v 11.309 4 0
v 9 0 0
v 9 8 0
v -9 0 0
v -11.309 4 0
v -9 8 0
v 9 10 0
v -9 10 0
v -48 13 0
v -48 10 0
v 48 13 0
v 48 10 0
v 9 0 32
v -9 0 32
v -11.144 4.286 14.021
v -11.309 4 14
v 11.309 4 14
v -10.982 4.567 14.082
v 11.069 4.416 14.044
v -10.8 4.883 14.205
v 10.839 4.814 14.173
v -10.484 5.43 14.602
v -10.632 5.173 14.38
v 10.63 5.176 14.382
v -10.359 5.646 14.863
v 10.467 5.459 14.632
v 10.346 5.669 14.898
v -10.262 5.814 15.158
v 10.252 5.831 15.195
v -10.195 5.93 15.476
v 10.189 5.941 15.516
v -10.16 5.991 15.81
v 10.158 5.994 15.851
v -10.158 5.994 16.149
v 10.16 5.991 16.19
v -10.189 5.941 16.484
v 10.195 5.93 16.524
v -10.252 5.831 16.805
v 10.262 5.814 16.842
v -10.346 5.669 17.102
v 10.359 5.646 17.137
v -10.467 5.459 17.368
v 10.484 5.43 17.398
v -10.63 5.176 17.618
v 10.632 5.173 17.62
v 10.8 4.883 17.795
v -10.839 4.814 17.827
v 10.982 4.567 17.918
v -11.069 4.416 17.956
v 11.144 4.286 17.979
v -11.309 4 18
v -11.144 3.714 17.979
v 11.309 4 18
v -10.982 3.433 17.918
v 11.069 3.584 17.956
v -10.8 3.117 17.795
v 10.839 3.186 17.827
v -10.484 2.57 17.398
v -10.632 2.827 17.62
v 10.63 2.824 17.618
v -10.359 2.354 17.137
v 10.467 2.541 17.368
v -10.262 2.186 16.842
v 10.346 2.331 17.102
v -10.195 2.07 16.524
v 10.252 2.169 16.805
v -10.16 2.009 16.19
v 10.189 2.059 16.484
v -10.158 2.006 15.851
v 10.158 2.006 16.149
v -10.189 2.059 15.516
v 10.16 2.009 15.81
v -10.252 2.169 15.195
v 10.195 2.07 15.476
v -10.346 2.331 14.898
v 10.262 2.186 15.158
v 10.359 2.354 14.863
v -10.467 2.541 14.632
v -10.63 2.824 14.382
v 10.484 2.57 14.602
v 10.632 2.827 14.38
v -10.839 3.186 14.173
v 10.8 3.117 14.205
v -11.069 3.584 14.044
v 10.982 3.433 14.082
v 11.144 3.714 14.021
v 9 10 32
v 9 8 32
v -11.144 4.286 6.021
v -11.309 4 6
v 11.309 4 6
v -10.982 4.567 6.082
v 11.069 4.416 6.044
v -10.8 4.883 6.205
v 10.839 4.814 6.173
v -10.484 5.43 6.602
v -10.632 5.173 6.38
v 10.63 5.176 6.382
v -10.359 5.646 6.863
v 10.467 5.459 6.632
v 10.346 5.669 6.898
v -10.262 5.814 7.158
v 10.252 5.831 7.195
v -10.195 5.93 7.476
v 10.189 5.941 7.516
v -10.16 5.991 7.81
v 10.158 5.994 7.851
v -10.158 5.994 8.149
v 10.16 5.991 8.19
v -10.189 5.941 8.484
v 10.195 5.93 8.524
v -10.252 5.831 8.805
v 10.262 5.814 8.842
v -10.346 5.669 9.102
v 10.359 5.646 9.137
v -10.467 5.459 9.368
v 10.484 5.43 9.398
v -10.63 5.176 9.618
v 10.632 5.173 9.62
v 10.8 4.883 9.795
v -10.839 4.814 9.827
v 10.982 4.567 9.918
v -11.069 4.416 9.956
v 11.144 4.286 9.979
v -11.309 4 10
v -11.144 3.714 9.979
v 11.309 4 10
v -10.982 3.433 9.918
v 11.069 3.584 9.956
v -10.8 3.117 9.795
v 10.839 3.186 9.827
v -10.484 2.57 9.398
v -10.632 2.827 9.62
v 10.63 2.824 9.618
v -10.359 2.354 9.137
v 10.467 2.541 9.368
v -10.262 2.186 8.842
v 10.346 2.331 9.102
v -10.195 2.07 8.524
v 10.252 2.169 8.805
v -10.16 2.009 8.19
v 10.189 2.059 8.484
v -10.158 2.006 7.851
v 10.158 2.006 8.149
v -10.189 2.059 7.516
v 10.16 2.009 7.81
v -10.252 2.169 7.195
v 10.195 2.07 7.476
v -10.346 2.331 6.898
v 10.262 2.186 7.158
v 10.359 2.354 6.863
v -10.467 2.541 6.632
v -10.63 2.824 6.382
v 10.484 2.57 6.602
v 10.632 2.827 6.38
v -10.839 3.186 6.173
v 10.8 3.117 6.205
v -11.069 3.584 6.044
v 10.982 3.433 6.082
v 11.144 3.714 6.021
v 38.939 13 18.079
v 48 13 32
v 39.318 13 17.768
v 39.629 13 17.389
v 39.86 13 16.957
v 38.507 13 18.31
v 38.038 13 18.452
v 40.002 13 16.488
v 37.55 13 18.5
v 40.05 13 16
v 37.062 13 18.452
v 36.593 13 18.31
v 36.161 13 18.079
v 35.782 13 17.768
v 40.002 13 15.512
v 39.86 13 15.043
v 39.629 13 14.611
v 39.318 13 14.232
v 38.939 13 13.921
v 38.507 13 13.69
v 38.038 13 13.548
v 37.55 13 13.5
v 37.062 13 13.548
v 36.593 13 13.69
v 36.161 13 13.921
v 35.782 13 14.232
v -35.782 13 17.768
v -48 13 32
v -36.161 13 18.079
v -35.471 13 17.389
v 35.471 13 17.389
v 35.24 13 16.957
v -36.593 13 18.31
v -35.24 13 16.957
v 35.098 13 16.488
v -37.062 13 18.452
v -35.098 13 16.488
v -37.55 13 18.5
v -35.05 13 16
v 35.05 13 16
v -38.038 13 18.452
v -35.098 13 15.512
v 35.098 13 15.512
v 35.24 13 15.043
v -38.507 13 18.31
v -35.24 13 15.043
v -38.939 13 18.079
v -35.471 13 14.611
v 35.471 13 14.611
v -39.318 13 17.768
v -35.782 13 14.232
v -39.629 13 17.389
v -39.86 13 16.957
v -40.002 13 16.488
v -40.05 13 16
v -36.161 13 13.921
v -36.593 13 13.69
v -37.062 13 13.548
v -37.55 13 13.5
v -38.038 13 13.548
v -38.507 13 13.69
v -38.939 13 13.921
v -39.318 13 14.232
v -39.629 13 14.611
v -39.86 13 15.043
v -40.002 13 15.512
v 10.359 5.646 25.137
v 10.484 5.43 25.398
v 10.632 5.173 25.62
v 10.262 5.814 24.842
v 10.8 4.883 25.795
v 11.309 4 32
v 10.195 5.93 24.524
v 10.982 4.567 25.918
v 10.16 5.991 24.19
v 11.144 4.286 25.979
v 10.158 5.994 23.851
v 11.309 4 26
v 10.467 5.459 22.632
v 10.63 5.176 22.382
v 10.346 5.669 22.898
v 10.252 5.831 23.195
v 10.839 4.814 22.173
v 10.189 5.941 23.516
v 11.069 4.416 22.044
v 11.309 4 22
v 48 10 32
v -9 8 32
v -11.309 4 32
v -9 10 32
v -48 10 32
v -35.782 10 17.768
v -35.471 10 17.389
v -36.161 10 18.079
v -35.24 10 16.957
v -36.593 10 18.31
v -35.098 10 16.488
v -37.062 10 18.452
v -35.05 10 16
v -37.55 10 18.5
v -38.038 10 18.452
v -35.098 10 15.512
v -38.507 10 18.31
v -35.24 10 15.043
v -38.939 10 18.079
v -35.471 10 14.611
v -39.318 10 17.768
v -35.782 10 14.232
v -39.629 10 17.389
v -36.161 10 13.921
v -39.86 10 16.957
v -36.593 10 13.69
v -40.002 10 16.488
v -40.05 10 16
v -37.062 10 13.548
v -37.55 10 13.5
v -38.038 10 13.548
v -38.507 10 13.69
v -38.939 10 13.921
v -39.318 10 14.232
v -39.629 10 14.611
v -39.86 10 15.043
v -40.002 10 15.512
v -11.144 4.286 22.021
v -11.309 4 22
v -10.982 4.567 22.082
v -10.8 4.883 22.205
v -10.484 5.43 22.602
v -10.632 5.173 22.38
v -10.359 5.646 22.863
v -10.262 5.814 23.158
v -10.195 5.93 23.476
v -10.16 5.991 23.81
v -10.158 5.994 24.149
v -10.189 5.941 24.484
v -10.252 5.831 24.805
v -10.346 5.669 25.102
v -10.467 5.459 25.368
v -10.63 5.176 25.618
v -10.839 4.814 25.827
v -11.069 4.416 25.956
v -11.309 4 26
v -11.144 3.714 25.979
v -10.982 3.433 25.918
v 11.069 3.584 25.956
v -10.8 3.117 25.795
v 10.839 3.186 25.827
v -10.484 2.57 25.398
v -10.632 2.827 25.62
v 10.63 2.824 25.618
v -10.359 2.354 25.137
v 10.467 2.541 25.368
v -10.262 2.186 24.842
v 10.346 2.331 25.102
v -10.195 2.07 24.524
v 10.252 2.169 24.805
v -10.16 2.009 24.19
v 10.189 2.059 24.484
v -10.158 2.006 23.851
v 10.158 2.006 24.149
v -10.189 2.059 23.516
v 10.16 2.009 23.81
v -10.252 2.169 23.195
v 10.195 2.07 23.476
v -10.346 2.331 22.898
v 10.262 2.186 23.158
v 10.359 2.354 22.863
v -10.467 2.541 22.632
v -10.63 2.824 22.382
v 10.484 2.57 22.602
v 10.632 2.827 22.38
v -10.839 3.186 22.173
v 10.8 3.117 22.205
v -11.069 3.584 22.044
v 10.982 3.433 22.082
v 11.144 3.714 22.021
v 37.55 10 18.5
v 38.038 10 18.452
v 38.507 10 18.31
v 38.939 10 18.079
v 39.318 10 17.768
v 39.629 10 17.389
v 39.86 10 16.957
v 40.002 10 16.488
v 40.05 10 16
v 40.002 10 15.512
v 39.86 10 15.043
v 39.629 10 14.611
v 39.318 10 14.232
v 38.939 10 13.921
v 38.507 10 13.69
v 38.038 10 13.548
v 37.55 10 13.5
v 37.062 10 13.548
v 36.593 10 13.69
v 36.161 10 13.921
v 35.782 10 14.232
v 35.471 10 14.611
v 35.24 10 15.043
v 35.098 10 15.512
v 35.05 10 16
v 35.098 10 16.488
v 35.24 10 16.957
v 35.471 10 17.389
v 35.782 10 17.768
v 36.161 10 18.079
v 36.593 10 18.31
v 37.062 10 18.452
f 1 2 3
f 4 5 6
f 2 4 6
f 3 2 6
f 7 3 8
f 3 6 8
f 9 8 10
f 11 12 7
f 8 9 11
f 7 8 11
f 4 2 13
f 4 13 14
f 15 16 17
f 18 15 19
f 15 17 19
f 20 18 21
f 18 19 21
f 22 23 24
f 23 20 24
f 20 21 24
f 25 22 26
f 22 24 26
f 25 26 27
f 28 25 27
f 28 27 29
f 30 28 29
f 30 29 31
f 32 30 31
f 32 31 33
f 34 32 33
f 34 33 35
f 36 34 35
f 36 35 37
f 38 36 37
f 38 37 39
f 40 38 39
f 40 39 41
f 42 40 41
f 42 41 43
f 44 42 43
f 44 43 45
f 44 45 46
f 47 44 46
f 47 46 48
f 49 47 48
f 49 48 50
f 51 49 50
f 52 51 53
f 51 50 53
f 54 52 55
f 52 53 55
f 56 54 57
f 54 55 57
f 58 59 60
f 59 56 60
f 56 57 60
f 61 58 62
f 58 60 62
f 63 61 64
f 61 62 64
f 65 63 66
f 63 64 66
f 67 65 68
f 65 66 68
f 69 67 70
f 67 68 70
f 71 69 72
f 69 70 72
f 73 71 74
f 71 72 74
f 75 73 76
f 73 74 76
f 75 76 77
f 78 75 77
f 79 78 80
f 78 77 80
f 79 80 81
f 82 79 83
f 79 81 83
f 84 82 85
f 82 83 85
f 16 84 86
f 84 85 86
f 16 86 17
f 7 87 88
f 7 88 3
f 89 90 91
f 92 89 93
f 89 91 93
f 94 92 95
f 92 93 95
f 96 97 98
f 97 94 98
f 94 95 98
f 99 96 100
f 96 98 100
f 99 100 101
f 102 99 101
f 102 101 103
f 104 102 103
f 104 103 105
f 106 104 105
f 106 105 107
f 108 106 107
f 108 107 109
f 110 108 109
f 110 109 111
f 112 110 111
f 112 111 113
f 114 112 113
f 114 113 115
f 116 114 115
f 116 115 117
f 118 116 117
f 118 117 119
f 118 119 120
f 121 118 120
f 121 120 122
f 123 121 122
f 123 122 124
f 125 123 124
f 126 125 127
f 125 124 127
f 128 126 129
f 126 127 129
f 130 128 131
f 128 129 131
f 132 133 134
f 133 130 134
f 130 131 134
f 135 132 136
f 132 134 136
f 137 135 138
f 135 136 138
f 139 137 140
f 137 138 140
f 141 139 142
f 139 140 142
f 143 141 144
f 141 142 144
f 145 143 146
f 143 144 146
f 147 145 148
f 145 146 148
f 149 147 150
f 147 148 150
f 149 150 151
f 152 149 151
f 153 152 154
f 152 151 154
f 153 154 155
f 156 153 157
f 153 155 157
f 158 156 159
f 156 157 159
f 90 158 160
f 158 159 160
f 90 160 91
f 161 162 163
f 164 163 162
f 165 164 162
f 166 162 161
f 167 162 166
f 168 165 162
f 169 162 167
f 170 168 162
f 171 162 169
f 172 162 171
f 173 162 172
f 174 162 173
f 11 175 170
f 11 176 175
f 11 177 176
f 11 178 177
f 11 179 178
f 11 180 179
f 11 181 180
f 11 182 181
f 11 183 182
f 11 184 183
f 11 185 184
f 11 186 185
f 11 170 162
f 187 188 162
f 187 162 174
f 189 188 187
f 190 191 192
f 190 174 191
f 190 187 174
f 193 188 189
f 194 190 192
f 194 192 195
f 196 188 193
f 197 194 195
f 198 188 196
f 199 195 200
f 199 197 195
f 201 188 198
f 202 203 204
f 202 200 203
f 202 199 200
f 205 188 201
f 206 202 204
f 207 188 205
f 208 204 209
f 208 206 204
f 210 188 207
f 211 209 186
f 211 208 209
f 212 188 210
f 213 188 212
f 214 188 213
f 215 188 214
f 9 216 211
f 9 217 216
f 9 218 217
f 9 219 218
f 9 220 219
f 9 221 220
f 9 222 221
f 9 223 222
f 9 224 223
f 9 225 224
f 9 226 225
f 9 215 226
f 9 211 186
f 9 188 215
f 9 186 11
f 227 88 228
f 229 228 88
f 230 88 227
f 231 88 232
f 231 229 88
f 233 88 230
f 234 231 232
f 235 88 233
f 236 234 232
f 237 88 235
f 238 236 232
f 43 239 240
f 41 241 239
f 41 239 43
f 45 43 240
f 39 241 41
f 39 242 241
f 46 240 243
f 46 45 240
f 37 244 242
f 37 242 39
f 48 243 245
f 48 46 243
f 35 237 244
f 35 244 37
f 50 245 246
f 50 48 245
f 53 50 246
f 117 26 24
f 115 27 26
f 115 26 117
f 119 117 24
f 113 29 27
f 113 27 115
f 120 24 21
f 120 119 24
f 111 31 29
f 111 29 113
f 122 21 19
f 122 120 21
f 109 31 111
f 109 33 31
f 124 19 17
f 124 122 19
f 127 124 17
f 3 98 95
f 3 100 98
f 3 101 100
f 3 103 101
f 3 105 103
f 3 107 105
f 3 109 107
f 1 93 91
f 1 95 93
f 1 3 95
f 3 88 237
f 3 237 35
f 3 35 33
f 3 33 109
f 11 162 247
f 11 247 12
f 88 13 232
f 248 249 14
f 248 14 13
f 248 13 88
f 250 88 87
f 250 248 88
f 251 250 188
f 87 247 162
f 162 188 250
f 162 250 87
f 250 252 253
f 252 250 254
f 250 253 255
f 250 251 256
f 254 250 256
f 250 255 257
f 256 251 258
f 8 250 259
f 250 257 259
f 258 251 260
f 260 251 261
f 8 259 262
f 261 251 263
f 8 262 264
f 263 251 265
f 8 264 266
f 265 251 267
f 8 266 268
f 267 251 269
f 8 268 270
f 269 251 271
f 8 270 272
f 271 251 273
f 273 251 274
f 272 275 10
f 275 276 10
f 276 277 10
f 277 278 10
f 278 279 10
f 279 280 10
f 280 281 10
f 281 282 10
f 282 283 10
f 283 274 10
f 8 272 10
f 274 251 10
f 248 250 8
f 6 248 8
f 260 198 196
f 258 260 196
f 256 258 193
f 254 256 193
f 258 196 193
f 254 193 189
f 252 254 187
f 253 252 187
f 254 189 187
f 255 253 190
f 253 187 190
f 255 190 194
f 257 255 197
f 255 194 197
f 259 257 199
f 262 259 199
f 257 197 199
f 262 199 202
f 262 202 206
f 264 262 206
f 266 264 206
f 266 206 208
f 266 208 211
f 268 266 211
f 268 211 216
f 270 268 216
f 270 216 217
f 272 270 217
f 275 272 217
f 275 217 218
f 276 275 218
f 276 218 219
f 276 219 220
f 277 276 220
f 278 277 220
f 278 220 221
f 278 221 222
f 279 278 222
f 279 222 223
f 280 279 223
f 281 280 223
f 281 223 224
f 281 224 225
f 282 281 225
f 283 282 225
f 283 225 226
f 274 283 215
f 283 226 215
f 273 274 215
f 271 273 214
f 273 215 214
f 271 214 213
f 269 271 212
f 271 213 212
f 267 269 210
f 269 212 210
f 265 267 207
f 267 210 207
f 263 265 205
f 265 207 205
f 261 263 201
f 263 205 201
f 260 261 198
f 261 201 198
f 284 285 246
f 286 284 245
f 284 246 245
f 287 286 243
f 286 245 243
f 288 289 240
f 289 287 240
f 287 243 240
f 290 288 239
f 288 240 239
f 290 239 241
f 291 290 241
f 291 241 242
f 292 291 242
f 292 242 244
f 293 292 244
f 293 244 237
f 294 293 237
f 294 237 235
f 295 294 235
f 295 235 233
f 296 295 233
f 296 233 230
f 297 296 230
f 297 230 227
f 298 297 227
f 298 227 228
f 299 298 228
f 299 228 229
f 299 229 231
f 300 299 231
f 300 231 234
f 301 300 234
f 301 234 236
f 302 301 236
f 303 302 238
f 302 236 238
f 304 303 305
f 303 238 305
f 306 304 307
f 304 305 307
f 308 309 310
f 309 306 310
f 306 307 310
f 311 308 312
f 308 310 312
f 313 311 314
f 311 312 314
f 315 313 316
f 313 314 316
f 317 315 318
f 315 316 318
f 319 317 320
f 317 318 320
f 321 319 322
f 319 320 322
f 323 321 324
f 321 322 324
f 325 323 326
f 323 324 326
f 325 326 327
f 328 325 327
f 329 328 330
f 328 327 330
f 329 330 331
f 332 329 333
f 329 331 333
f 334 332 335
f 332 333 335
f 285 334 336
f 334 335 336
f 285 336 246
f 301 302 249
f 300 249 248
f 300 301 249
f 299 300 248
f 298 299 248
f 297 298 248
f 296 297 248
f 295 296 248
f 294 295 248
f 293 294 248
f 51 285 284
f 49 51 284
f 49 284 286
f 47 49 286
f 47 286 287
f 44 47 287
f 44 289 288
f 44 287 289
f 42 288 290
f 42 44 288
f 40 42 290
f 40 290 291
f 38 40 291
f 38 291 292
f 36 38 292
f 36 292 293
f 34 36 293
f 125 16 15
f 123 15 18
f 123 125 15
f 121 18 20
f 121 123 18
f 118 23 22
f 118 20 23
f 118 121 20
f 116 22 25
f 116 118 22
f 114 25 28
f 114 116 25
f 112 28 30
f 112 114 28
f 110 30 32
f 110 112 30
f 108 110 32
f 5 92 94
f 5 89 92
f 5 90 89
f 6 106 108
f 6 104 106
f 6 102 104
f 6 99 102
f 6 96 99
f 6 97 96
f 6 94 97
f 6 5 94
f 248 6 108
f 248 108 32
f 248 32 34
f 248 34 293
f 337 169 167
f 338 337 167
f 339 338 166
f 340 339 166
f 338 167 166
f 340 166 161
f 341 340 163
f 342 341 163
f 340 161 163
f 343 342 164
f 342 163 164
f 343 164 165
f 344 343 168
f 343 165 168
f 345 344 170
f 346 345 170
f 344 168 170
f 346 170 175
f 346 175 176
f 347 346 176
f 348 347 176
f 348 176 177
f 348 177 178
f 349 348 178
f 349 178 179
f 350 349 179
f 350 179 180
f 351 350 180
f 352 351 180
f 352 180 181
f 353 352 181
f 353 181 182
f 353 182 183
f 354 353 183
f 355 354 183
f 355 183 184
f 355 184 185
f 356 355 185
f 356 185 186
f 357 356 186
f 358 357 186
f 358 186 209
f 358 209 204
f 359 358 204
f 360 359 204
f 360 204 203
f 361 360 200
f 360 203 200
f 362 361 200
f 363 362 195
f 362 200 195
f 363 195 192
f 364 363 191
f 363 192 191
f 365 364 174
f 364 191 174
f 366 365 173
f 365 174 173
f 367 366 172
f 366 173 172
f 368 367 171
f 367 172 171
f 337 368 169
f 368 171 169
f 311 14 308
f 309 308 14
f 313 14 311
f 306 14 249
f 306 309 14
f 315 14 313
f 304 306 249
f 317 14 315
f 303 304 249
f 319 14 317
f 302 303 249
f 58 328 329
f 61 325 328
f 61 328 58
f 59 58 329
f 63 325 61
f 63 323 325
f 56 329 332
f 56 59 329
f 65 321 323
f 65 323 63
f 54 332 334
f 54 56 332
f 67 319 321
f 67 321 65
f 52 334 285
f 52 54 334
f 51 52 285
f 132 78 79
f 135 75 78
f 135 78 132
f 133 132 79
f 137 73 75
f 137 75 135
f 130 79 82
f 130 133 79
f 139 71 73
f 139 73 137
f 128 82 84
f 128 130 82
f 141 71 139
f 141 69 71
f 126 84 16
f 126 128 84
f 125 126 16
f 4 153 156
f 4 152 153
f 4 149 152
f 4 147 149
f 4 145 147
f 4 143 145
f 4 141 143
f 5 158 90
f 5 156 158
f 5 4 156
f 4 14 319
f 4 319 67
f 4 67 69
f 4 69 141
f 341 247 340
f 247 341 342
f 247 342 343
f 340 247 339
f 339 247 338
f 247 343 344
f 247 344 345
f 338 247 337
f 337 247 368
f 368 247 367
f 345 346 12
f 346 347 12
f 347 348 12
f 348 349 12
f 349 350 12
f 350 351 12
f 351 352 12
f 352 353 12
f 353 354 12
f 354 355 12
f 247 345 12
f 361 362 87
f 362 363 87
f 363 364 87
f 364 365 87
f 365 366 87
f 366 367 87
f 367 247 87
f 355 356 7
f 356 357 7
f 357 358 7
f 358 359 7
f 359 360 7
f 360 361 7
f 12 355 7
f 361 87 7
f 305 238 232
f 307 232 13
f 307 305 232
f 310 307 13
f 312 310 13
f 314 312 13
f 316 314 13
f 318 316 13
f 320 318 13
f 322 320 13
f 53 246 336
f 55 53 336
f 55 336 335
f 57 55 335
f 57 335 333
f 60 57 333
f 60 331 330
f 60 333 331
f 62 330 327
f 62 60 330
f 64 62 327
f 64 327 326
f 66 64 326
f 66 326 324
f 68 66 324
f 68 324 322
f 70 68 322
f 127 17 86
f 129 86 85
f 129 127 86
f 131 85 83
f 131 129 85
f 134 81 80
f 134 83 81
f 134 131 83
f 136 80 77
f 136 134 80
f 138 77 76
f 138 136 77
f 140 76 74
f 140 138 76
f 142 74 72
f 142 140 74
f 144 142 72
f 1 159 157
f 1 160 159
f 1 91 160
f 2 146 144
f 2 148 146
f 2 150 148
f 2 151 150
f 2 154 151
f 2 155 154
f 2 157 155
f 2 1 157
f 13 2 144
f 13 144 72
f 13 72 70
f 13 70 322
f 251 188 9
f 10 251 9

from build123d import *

# Parameters (mm, degrees)
BOSS_EXTRUDE1_DEPTH      = 32
SKETCH2_R                = 2
CUT_EXTRUDE1_DEPTH       = 35.869794274
LPATTERN1_COUNT          = 3
LPATTERN1_PITCH          = 8
BOSS_EXTRUDE2_DEPTH      = 9
BOSS_EXTRUDE2_DEPTH_BACK = 9
SKETCH3_W                = 32
SKETCH3_H                = 2
BOSS_EXTRUDE3_DEPTH      = 48
BOSS_EXTRUDE3_DEPTH_BACK = 48
SKETCH4_W                = 32
SKETCH4_H                = 3
SKETCH5_R                = 2.5
CUT_EXTRUDE2_DEPTH       = 10


with BuildPart() as part:
    # Sketch1 → Boss-Extrude1 (new body)
    with BuildSketch(Plane.XY):
        Polygon((9, 0), (-9, 0), (-11.309401077, 4), (-9, 8), (9, 8), (11.309401077, 4), align=None)
    extrude(amount=BOSS_EXTRUDE1_DEPTH)

    # Sketch2 → Cut-Extrude1 (cut, symmetric)
    with BuildSketch(Plane(origin=(0, 0, 0), x_dir=(0, 0, -1), z_dir=(1, 0, 0))):
        with Locations((-24, 4)):
            Circle(SKETCH2_R)
    cut_extrude1 = extrude(amount=CUT_EXTRUDE1_DEPTH, both=True, mode=Mode.SUBTRACT)

    # LPattern1: Cut-Extrude1 ×3
    with Locations(*[(0, 0, -i * LPATTERN1_PITCH) for i in range(1, LPATTERN1_COUNT)]):
        add(cut_extrude1, mode=Mode.SUBTRACT)

    # Sketch3 → Boss-Extrude2 (add, two sides: drawn at the far end of the back side and taken through both)
    with BuildSketch(Plane(origin=(0, 0, 0), x_dir=(0, 0, -1), z_dir=(1, 0, 0)).offset(-BOSS_EXTRUDE2_DEPTH_BACK)):
        with Locations((-16, 9)):
            Rectangle(SKETCH3_W, SKETCH3_H)
    extrude(amount=BOSS_EXTRUDE2_DEPTH + BOSS_EXTRUDE2_DEPTH_BACK)

    # Sketch4 → Boss-Extrude3 (add, two sides: drawn at the far end of the back side and taken through both)
    with BuildSketch(Plane(origin=(0, 0, 0), x_dir=(0, 0, -1), z_dir=(1, 0, 0)).offset(-BOSS_EXTRUDE3_DEPTH_BACK)):
        with Locations((-16, 11.5)):
            Rectangle(SKETCH4_W, SKETCH4_H)
    extrude(amount=BOSS_EXTRUDE3_DEPTH + BOSS_EXTRUDE3_DEPTH_BACK)

    # Sketch5 → Cut-Extrude2 (cut)
    with BuildSketch(Plane(origin=(0, 13, 0), x_dir=(1, 0, 0), z_dir=(0, 1, 0))):
        with Locations(Location((-37.55, -16, 0), (0, 0, 270))):
            Circle(SKETCH5_R)
        with Locations(Location((37.55, -16, 0), (0, 0, 270))):
            Circle(SKETCH5_R)
    extrude(amount=-CUT_EXTRUDE2_DEPTH, mode=Mode.SUBTRACT)


solid = part.part
